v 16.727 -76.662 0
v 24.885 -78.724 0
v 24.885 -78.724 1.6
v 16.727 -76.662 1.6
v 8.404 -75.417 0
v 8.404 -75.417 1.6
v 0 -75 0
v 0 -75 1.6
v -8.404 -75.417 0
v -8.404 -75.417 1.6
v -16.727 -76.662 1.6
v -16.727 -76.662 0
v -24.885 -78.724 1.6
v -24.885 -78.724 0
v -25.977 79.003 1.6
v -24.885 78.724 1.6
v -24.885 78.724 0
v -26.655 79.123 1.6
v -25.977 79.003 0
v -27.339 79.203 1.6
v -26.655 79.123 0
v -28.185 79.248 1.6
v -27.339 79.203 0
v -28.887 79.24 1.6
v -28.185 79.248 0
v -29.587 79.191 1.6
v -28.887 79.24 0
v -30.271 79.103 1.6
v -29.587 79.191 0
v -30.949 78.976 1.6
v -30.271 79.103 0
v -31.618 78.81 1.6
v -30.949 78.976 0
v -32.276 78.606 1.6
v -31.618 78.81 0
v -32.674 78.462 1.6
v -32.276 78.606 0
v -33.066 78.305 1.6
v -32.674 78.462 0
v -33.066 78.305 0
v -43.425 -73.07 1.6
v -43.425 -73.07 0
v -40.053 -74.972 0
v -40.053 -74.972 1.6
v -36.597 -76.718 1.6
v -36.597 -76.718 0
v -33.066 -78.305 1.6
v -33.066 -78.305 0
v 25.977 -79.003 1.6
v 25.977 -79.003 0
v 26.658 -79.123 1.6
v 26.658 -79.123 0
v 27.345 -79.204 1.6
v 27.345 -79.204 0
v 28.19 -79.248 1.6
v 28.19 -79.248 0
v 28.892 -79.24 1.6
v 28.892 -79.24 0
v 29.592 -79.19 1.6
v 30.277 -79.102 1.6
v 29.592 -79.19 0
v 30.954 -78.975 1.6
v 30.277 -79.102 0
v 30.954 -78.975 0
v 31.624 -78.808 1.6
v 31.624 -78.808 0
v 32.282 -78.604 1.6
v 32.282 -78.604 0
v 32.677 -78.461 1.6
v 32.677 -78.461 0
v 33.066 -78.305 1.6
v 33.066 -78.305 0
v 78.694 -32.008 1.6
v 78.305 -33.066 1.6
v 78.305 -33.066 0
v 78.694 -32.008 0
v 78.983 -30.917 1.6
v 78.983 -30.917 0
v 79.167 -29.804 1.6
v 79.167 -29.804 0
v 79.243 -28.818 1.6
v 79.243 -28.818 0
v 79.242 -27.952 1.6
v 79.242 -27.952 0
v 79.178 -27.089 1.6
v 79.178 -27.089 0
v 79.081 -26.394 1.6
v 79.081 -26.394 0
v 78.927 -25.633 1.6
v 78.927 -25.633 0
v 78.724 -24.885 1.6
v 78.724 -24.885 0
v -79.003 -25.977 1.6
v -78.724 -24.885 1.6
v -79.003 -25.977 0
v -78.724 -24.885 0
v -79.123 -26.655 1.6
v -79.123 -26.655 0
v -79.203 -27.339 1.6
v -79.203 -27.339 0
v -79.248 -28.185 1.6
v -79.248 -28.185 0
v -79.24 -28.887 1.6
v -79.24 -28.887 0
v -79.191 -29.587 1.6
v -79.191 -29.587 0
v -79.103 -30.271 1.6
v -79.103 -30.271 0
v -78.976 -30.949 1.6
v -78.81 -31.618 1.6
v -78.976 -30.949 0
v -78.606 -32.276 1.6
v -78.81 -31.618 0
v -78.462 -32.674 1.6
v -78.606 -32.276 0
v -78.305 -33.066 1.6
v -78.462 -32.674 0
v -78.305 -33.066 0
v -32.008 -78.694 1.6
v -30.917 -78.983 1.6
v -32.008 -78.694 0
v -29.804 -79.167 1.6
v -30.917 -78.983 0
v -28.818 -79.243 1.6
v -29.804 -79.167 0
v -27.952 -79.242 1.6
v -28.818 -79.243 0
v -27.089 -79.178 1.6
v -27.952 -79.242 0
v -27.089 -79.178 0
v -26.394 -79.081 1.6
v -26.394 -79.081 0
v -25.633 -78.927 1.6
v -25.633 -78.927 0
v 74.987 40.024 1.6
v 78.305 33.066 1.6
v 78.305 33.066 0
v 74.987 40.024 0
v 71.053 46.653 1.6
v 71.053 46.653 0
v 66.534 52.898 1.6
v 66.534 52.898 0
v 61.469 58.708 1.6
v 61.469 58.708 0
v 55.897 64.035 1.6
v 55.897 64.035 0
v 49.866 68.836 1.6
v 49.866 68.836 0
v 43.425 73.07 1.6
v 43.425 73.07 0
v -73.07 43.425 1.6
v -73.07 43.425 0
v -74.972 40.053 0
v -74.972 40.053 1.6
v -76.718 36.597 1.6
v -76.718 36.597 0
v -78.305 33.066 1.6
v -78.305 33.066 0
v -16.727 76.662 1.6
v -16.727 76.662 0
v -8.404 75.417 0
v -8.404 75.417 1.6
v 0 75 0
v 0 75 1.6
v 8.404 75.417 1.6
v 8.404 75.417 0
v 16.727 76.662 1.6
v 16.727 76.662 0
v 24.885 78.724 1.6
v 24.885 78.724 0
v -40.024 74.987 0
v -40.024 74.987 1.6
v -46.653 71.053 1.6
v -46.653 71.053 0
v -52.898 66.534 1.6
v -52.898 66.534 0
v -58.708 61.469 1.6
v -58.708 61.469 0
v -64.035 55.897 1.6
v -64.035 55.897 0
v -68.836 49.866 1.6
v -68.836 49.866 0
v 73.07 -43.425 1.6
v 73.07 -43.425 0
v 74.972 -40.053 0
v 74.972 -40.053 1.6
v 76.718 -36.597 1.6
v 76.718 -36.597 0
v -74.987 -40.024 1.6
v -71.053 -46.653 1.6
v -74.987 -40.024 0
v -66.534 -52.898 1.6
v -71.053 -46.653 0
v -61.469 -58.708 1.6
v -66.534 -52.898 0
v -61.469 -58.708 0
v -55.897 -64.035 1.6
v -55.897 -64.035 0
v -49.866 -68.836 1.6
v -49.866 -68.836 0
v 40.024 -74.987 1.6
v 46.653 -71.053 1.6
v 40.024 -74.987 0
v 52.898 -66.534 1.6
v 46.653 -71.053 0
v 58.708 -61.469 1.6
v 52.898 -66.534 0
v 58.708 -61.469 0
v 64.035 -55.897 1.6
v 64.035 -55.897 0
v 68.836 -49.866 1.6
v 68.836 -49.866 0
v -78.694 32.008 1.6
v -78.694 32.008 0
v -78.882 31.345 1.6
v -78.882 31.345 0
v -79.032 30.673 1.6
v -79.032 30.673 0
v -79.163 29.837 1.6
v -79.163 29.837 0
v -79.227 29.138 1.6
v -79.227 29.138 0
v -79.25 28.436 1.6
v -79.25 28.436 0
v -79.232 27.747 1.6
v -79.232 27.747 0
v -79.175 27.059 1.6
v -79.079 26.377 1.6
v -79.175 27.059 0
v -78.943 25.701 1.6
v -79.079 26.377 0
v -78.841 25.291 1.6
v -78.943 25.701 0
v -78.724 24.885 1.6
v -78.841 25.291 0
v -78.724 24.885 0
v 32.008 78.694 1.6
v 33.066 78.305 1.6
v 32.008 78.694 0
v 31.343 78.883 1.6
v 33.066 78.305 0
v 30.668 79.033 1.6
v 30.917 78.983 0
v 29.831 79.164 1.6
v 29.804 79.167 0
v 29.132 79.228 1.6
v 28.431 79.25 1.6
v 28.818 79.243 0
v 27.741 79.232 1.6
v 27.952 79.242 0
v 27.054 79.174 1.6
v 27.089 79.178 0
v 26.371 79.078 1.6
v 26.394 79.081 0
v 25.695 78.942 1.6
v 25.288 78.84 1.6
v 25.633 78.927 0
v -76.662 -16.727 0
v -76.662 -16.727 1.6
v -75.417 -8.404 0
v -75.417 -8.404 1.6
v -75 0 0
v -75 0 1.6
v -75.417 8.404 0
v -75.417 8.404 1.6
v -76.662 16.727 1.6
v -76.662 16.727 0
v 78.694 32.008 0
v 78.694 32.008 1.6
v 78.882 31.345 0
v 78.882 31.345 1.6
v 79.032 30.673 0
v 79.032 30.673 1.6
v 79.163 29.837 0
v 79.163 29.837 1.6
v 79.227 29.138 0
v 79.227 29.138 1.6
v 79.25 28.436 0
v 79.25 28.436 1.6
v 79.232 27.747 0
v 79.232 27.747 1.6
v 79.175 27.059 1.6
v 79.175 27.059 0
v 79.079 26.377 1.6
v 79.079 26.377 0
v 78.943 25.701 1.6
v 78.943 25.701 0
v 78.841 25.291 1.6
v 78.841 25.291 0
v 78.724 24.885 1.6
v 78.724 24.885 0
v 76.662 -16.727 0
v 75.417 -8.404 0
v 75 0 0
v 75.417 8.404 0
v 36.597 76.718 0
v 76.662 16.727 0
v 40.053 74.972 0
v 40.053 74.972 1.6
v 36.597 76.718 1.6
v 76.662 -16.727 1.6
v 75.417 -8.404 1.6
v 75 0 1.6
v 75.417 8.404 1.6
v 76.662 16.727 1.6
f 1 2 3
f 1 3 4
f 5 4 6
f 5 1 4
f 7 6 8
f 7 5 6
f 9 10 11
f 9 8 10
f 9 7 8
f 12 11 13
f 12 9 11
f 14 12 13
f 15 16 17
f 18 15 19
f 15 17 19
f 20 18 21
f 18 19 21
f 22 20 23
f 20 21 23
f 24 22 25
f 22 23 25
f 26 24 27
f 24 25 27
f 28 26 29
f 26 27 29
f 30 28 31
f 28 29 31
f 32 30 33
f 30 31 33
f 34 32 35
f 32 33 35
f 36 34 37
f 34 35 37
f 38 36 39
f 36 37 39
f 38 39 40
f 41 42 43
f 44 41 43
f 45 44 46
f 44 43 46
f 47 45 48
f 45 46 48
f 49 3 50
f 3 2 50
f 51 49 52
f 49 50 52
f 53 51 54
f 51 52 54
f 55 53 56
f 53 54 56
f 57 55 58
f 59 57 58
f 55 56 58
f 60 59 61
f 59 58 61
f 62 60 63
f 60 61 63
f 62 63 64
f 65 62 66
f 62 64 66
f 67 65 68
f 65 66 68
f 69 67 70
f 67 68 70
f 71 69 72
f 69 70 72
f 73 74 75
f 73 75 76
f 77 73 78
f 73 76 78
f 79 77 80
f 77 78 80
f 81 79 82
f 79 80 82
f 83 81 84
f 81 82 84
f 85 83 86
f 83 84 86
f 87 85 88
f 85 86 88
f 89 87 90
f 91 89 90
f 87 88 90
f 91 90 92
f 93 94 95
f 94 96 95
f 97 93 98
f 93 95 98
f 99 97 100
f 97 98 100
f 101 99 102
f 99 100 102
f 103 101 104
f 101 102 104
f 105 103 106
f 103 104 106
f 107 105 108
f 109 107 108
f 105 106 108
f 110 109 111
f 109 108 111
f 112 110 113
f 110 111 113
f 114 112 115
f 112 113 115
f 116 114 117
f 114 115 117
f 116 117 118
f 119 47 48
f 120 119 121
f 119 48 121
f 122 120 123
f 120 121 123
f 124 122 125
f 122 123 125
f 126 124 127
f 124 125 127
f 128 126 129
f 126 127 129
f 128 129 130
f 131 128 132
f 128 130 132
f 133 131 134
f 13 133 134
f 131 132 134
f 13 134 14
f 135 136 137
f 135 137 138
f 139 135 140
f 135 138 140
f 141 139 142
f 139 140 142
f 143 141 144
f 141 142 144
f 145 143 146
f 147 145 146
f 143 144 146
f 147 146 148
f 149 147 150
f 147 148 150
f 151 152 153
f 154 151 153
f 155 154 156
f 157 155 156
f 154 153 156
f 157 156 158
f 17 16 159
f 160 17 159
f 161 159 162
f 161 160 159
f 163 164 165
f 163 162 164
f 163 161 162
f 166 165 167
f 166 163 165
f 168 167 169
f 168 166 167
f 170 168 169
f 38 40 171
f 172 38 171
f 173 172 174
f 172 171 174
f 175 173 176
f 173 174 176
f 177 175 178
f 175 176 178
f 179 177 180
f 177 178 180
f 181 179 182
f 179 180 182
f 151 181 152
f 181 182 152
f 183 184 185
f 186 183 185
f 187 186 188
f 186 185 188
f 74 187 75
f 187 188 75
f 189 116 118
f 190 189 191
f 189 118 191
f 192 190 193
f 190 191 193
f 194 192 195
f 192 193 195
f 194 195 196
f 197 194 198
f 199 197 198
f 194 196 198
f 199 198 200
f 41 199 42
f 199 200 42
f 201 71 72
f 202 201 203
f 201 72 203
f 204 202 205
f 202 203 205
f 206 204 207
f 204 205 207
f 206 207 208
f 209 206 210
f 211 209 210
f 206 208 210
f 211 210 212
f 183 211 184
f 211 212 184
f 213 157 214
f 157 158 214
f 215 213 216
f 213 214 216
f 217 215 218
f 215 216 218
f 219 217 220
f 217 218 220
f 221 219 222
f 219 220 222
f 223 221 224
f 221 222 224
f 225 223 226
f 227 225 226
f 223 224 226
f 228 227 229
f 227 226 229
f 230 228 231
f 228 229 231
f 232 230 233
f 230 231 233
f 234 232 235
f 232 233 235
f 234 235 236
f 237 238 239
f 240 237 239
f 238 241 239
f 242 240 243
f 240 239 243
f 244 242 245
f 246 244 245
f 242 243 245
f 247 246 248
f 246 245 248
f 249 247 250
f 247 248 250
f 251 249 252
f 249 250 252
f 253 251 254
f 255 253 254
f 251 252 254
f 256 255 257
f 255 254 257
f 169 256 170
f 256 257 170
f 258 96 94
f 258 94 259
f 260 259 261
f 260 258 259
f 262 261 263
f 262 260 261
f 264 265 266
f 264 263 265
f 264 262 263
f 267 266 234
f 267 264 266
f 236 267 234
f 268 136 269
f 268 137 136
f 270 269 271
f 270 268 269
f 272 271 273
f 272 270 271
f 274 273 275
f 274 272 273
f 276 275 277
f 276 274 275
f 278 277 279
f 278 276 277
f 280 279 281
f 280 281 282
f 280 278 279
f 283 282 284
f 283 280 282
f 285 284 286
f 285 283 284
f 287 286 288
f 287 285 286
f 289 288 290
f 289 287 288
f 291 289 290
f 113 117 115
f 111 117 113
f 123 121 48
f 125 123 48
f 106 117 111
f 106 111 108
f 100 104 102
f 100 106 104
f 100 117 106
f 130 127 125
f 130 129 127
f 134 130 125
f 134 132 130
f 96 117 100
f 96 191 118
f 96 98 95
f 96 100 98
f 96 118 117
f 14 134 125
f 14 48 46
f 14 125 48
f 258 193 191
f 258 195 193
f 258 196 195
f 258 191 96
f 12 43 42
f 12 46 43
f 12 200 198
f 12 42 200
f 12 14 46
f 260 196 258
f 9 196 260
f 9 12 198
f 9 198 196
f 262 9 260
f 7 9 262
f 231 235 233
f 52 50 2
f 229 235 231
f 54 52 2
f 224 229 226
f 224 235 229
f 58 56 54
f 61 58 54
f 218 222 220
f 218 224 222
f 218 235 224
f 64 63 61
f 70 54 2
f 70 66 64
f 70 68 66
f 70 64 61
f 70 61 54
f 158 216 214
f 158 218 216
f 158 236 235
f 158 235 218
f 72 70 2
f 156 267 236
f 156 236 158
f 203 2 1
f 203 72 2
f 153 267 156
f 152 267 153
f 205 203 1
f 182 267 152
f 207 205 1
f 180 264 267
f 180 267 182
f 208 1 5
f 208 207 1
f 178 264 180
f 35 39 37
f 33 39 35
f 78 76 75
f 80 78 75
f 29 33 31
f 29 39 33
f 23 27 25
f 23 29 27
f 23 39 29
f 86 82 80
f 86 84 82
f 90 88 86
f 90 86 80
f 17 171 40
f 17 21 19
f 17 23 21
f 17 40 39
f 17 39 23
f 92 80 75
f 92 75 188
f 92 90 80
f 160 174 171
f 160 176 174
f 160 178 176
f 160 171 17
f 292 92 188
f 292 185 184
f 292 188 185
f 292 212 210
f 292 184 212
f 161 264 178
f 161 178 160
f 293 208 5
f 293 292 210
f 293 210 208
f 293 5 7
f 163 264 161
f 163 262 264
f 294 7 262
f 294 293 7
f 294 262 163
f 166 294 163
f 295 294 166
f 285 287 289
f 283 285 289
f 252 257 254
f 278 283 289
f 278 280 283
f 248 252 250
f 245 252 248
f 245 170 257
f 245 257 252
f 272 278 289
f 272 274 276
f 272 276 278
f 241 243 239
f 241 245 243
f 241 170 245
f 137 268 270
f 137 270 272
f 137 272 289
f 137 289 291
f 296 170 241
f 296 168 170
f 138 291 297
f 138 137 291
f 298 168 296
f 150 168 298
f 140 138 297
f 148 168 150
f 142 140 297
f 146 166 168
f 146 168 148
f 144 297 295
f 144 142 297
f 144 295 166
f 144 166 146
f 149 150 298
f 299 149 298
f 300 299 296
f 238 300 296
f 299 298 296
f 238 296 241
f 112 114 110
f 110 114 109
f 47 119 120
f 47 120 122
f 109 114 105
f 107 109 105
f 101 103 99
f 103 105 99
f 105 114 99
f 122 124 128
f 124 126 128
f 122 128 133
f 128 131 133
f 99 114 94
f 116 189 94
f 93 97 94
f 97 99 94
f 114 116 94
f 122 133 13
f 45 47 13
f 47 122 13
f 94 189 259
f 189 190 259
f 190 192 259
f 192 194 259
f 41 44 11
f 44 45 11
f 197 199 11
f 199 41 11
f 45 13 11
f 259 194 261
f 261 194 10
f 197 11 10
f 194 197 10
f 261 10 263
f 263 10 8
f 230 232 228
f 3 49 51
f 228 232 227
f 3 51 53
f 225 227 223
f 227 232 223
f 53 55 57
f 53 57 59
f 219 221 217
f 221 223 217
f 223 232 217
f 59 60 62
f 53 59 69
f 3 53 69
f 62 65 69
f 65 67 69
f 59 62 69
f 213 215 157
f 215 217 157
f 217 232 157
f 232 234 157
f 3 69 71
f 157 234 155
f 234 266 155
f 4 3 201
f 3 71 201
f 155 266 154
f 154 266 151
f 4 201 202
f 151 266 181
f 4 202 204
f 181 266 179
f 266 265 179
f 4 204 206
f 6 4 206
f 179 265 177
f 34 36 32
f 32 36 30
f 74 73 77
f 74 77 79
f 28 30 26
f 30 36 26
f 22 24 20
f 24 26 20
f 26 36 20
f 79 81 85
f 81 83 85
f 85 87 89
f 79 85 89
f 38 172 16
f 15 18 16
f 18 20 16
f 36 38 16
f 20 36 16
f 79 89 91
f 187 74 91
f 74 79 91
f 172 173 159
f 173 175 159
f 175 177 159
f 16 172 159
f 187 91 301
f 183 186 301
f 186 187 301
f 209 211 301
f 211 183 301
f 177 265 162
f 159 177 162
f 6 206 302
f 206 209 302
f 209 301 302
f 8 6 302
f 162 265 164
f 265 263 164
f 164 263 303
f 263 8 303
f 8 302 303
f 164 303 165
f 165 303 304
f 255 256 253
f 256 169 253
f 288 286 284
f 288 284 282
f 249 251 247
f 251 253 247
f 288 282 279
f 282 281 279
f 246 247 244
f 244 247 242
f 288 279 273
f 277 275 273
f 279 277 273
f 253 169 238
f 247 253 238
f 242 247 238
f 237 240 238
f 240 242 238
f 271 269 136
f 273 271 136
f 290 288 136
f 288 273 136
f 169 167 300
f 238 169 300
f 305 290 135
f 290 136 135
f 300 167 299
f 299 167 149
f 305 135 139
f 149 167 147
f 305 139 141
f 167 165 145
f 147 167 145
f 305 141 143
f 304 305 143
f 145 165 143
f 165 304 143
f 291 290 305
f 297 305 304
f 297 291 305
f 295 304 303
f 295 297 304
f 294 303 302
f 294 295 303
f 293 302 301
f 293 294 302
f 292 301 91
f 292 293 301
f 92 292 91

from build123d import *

# Parameters (mm, degrees)
PAD_DEPTH             = 1.6
POLARPATTERN_COUNT    = 4
POCKET_DEPTH          = 5
POLARPATTERN001_COUNT = 4
FILLET_R              = 12


with BuildPart() as part:
    # Sketch → Pad (new body)
    with BuildSketch(Plane.XY):
        with BuildLine():
            Line((0, 0), (-85, 0))
            ThreePointArc((-73.070068, 43.425398), (-81.963272, 22.517151), (-85, 0))
            ThreePointArc((0, 85), (-42.034755, 73.878816), (-73.070068, 43.425398))
            Line((0, 0), (0, 85))
        make_face()
    pad = extrude(amount=PAD_DEPTH)

    # PolarPattern: Pad ×4 about axis
    polarpattern_axis = Axis((0, 0, 0), (0, 0, 1))
    for i in range(1, POLARPATTERN_COUNT):
        add(pad.rotate(polarpattern_axis, i * 360 / POLARPATTERN_COUNT))

    # Sketch001 → Pocket (cut)
    with BuildSketch(Plane.XY):
        with BuildLine():
            ThreePointArc((-91.627857, -50.5), (-75, 0), (-91.627857, 50.5))
            Line((-91.627857, 50.5), (-91.627857, -50.5))
        make_face()
    pocket = extrude(amount=POCKET_DEPTH, mode=Mode.SUBTRACT)

    # PolarPattern001: Pocket ×4 about axis
    polarpattern001_axis = Axis((0, 0, 0), (0, 0, 1))
    for i in range(1, POLARPATTERN001_COUNT):
        add(pocket.rotate(polarpattern001_axis, i * 360 / POLARPATTERN001_COUNT), mode=Mode.SUBTRACT)

    # Fillet
    fillet_edges = [part.edges().sort_by_distance(p)[0] for p in [
        (-80, 28.722813, 0.8),
        (-80, -28.722813, 0.8),
        (-28.722813, 80, 0.8),
        (28.722813, 80, 0.8),
        (80, 28.722813, 0.8),
        (80, -28.722813, 0.8),
        (-28.722813, -80, 0.8),
        (28.722813, -80, 0.8),
    ]]
    fillet(fillet_edges, radius=FILLET_R)


solid = part.part
